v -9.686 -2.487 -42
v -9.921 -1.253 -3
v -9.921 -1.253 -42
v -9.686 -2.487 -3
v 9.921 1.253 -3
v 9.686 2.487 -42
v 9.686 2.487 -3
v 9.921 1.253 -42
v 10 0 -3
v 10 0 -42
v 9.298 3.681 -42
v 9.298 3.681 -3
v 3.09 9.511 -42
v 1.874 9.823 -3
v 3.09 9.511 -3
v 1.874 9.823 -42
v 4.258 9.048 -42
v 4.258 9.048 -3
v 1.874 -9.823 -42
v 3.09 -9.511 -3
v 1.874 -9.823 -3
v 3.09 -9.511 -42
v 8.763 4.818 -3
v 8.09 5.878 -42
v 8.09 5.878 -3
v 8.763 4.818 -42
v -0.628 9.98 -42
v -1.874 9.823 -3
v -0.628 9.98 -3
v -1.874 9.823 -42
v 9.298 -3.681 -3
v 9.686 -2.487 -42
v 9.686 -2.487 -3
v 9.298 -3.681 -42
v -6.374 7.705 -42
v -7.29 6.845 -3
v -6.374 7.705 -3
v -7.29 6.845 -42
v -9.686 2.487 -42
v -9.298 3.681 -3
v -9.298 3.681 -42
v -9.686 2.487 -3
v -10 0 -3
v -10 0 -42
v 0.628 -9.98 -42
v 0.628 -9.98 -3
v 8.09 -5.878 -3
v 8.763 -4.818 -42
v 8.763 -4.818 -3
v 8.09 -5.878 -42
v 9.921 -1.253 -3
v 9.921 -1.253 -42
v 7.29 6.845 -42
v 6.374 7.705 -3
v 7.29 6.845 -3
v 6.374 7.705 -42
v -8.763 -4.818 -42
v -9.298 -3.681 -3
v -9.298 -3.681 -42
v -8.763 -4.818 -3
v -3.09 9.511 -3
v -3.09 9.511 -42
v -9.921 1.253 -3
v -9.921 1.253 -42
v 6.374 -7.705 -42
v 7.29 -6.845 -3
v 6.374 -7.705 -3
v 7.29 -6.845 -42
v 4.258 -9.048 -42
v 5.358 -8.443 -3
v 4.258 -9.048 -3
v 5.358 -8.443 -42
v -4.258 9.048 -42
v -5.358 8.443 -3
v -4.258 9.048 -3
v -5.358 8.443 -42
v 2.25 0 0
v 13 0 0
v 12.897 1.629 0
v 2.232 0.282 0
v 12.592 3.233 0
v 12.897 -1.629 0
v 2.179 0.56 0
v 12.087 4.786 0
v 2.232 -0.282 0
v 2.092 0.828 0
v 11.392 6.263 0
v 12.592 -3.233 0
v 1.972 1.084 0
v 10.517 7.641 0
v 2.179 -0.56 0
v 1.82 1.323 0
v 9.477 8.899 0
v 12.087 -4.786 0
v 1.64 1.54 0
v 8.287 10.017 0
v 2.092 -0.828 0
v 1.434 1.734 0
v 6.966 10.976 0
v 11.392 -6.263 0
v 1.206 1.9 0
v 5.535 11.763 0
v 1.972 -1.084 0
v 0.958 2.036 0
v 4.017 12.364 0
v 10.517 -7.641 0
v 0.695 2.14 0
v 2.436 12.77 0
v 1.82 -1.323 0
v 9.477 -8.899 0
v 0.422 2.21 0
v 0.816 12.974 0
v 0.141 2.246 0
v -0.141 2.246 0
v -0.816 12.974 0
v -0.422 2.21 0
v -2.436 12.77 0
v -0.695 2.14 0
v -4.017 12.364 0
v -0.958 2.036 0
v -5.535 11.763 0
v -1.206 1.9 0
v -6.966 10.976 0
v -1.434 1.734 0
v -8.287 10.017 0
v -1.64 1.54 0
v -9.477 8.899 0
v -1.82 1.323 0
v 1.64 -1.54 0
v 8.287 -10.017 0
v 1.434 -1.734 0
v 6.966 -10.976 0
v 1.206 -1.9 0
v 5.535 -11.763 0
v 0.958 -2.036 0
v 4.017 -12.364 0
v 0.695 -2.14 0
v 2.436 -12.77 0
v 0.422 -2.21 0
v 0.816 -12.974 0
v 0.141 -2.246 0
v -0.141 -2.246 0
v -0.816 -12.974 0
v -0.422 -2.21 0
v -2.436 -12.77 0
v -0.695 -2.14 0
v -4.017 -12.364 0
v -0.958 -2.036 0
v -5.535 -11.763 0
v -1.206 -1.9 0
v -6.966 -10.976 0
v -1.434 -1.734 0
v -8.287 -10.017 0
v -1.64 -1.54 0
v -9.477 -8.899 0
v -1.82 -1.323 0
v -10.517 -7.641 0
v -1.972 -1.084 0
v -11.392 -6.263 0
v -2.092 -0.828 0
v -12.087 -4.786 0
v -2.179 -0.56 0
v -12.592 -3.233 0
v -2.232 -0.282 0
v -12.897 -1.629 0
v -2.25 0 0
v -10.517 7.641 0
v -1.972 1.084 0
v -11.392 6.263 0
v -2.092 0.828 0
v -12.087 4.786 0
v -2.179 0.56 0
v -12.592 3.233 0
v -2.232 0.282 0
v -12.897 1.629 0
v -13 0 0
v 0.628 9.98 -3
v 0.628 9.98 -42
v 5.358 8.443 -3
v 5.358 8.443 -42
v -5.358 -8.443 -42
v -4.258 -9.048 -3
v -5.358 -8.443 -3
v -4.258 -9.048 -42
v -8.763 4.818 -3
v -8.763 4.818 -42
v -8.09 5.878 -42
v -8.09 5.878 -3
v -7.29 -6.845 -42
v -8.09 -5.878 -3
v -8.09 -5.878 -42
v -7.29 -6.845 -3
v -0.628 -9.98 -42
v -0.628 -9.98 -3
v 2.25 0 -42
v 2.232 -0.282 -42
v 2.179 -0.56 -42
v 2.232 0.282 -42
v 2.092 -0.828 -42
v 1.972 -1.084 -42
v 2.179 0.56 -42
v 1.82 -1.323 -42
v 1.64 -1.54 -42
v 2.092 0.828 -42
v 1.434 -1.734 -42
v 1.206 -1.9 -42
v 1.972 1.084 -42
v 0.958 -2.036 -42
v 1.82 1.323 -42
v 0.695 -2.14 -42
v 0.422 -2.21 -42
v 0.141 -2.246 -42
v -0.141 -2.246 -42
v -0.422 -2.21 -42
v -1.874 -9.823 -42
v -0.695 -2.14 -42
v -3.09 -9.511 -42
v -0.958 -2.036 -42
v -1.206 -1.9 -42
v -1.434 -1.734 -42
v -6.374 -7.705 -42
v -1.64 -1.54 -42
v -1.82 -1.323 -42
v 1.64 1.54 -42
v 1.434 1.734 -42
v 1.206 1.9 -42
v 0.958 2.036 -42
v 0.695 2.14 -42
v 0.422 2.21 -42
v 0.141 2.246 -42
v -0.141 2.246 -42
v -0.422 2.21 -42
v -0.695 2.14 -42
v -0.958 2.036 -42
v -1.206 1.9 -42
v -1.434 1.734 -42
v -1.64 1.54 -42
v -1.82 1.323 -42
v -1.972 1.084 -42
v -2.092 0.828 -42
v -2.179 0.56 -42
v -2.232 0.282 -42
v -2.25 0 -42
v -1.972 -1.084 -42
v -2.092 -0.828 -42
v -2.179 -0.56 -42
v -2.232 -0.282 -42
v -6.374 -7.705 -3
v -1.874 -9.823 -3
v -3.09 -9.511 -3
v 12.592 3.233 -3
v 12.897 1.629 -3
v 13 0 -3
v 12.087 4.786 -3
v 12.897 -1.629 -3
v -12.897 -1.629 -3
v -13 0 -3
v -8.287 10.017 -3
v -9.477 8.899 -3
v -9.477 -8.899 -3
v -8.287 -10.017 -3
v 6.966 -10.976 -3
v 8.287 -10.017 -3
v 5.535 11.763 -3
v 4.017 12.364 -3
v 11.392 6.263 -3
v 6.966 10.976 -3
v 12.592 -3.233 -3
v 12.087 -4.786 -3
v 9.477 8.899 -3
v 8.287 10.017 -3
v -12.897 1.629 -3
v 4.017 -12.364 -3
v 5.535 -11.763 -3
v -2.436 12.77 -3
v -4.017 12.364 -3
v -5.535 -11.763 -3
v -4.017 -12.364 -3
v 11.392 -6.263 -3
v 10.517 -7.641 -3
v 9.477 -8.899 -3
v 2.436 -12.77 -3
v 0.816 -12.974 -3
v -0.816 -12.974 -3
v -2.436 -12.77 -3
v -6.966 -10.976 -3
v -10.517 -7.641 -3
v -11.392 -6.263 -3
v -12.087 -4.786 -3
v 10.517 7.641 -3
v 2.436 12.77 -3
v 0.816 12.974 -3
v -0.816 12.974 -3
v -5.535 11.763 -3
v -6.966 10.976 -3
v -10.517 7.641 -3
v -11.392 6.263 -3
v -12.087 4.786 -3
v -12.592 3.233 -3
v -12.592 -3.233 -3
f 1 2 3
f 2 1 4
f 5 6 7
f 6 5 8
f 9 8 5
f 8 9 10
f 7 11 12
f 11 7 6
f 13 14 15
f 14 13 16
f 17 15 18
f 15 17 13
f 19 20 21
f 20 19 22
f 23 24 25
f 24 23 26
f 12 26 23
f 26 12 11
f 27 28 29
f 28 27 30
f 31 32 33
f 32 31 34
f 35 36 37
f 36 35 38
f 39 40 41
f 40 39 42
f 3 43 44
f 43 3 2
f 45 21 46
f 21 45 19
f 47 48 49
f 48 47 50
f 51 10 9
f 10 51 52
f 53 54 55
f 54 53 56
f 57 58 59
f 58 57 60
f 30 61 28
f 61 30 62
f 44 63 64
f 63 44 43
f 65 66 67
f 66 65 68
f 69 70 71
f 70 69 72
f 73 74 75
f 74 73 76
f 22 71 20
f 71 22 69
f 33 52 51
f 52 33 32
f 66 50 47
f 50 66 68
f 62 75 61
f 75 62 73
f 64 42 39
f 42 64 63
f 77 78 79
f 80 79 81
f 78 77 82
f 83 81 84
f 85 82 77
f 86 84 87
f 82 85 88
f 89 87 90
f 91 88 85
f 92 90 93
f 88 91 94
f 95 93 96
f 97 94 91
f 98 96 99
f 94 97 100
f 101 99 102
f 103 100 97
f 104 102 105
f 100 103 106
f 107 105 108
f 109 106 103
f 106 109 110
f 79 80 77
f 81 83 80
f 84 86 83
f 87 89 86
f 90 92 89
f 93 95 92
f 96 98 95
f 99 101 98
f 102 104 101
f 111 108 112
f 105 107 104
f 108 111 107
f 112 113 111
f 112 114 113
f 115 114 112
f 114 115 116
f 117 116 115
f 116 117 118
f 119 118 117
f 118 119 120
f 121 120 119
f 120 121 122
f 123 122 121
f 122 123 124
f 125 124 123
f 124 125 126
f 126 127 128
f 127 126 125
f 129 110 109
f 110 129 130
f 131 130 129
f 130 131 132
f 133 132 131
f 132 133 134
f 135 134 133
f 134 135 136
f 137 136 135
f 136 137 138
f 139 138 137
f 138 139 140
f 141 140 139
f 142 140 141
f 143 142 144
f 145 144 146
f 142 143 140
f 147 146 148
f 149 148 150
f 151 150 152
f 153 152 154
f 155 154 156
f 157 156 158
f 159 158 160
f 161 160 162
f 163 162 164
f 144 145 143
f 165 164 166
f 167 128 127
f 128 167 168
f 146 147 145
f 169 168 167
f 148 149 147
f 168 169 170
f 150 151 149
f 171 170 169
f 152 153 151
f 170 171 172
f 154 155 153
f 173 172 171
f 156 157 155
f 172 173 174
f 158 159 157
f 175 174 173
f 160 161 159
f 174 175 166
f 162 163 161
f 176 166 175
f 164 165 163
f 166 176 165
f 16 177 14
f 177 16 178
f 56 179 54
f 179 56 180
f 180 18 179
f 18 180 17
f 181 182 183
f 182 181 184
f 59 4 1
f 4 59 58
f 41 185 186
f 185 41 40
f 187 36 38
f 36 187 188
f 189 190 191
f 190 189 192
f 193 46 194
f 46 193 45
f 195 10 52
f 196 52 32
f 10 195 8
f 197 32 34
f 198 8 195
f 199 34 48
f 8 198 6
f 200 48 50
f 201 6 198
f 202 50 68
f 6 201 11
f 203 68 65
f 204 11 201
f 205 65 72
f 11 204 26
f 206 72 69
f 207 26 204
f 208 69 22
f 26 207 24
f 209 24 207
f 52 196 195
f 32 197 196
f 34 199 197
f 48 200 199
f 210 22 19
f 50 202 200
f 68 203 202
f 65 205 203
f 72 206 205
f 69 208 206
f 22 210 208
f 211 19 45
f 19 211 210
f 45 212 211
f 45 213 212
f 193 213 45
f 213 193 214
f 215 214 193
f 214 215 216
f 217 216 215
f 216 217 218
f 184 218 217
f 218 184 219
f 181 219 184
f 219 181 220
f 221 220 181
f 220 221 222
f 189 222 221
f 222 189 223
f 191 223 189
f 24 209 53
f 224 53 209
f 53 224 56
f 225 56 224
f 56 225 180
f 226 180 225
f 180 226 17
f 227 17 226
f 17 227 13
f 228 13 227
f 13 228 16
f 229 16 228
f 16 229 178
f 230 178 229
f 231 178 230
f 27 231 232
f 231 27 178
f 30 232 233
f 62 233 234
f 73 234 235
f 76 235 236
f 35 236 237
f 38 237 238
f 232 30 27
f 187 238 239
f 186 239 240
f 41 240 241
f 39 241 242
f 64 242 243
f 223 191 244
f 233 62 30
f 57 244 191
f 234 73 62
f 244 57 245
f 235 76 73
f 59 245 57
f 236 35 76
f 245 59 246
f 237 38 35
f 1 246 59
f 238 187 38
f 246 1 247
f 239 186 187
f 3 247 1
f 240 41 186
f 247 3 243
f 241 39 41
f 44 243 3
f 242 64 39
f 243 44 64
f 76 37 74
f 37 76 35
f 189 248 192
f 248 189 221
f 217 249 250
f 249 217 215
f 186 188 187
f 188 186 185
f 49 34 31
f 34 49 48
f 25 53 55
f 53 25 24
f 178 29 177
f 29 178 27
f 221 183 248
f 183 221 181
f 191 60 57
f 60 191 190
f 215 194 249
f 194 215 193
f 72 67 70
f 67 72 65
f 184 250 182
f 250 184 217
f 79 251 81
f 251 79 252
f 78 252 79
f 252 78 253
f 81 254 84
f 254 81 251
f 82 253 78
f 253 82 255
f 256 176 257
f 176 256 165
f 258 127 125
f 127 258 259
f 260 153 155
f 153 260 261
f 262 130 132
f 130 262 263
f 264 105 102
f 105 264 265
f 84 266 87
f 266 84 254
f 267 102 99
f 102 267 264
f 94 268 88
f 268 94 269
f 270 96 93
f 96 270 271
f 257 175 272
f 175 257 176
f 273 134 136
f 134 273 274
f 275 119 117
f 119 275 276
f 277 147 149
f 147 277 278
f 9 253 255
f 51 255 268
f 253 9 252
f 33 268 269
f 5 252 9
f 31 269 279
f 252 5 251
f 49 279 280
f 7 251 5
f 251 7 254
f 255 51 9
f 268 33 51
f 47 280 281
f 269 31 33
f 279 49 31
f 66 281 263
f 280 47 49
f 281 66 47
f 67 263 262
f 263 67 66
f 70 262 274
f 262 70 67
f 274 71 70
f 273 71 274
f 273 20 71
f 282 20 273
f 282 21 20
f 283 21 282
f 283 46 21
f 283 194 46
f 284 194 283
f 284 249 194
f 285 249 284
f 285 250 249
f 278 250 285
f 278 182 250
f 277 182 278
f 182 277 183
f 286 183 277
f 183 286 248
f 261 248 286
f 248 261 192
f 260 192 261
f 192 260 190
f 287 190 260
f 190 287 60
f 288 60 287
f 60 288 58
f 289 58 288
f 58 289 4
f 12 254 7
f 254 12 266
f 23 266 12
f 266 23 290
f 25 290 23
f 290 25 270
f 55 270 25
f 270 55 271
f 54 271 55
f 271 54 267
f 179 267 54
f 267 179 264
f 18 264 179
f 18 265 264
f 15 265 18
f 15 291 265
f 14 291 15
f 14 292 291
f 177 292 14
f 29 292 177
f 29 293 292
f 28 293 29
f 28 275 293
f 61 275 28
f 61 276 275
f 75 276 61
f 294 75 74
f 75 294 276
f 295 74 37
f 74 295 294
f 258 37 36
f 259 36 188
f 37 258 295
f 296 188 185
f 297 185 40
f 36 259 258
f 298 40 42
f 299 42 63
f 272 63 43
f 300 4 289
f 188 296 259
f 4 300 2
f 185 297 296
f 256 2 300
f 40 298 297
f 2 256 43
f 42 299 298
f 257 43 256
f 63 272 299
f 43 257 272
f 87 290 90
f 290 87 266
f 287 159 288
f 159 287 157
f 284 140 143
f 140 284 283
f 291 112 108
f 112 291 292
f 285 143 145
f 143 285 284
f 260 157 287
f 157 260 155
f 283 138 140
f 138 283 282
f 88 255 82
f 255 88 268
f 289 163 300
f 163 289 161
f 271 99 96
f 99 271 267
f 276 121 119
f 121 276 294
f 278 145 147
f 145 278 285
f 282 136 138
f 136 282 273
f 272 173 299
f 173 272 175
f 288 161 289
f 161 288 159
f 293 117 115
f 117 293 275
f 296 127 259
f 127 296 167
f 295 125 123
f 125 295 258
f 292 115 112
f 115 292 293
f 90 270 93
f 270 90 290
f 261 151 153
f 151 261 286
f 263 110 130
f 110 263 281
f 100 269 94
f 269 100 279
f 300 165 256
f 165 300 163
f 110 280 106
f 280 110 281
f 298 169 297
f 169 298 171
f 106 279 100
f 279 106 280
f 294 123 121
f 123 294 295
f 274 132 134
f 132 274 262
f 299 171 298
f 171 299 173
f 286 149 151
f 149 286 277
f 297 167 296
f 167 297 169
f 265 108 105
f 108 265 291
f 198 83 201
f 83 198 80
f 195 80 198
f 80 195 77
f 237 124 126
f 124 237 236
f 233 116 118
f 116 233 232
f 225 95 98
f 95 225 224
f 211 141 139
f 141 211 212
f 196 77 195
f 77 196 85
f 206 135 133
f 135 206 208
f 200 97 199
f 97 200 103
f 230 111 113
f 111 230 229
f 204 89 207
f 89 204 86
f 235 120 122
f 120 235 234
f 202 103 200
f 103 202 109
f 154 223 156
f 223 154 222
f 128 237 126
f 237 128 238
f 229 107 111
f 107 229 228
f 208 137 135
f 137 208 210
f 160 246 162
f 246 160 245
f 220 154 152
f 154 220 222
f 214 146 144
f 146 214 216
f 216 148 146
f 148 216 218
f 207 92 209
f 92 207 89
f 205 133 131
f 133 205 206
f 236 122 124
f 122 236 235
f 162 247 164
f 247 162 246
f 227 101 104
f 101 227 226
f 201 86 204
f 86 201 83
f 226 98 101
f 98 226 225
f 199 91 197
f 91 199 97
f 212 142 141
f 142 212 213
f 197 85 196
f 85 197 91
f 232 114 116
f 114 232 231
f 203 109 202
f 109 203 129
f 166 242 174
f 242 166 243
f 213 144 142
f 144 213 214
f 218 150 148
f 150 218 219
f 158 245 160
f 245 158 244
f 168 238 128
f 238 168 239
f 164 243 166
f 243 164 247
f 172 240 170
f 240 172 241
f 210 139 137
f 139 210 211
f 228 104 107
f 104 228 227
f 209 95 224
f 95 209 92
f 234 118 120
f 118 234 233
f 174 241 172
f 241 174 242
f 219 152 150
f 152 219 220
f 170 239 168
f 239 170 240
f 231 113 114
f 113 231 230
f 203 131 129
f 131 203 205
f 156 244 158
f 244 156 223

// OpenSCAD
$fn = 50;


difference() {
	union() {
		translate(v = [0, 0, -42.0000000000]) {
			cylinder(h = 42, r = 10.0000000000);
		}
		translate(v = [0, 0, -3.0000000000]) {
			cylinder(h = 3, r = 13.0000000000);
		}
	}
	union() {
		#translate(v = [0, 0, -42]) {
			cylinder(h = 42, r = 2.2500000000);
		}
	}
}
